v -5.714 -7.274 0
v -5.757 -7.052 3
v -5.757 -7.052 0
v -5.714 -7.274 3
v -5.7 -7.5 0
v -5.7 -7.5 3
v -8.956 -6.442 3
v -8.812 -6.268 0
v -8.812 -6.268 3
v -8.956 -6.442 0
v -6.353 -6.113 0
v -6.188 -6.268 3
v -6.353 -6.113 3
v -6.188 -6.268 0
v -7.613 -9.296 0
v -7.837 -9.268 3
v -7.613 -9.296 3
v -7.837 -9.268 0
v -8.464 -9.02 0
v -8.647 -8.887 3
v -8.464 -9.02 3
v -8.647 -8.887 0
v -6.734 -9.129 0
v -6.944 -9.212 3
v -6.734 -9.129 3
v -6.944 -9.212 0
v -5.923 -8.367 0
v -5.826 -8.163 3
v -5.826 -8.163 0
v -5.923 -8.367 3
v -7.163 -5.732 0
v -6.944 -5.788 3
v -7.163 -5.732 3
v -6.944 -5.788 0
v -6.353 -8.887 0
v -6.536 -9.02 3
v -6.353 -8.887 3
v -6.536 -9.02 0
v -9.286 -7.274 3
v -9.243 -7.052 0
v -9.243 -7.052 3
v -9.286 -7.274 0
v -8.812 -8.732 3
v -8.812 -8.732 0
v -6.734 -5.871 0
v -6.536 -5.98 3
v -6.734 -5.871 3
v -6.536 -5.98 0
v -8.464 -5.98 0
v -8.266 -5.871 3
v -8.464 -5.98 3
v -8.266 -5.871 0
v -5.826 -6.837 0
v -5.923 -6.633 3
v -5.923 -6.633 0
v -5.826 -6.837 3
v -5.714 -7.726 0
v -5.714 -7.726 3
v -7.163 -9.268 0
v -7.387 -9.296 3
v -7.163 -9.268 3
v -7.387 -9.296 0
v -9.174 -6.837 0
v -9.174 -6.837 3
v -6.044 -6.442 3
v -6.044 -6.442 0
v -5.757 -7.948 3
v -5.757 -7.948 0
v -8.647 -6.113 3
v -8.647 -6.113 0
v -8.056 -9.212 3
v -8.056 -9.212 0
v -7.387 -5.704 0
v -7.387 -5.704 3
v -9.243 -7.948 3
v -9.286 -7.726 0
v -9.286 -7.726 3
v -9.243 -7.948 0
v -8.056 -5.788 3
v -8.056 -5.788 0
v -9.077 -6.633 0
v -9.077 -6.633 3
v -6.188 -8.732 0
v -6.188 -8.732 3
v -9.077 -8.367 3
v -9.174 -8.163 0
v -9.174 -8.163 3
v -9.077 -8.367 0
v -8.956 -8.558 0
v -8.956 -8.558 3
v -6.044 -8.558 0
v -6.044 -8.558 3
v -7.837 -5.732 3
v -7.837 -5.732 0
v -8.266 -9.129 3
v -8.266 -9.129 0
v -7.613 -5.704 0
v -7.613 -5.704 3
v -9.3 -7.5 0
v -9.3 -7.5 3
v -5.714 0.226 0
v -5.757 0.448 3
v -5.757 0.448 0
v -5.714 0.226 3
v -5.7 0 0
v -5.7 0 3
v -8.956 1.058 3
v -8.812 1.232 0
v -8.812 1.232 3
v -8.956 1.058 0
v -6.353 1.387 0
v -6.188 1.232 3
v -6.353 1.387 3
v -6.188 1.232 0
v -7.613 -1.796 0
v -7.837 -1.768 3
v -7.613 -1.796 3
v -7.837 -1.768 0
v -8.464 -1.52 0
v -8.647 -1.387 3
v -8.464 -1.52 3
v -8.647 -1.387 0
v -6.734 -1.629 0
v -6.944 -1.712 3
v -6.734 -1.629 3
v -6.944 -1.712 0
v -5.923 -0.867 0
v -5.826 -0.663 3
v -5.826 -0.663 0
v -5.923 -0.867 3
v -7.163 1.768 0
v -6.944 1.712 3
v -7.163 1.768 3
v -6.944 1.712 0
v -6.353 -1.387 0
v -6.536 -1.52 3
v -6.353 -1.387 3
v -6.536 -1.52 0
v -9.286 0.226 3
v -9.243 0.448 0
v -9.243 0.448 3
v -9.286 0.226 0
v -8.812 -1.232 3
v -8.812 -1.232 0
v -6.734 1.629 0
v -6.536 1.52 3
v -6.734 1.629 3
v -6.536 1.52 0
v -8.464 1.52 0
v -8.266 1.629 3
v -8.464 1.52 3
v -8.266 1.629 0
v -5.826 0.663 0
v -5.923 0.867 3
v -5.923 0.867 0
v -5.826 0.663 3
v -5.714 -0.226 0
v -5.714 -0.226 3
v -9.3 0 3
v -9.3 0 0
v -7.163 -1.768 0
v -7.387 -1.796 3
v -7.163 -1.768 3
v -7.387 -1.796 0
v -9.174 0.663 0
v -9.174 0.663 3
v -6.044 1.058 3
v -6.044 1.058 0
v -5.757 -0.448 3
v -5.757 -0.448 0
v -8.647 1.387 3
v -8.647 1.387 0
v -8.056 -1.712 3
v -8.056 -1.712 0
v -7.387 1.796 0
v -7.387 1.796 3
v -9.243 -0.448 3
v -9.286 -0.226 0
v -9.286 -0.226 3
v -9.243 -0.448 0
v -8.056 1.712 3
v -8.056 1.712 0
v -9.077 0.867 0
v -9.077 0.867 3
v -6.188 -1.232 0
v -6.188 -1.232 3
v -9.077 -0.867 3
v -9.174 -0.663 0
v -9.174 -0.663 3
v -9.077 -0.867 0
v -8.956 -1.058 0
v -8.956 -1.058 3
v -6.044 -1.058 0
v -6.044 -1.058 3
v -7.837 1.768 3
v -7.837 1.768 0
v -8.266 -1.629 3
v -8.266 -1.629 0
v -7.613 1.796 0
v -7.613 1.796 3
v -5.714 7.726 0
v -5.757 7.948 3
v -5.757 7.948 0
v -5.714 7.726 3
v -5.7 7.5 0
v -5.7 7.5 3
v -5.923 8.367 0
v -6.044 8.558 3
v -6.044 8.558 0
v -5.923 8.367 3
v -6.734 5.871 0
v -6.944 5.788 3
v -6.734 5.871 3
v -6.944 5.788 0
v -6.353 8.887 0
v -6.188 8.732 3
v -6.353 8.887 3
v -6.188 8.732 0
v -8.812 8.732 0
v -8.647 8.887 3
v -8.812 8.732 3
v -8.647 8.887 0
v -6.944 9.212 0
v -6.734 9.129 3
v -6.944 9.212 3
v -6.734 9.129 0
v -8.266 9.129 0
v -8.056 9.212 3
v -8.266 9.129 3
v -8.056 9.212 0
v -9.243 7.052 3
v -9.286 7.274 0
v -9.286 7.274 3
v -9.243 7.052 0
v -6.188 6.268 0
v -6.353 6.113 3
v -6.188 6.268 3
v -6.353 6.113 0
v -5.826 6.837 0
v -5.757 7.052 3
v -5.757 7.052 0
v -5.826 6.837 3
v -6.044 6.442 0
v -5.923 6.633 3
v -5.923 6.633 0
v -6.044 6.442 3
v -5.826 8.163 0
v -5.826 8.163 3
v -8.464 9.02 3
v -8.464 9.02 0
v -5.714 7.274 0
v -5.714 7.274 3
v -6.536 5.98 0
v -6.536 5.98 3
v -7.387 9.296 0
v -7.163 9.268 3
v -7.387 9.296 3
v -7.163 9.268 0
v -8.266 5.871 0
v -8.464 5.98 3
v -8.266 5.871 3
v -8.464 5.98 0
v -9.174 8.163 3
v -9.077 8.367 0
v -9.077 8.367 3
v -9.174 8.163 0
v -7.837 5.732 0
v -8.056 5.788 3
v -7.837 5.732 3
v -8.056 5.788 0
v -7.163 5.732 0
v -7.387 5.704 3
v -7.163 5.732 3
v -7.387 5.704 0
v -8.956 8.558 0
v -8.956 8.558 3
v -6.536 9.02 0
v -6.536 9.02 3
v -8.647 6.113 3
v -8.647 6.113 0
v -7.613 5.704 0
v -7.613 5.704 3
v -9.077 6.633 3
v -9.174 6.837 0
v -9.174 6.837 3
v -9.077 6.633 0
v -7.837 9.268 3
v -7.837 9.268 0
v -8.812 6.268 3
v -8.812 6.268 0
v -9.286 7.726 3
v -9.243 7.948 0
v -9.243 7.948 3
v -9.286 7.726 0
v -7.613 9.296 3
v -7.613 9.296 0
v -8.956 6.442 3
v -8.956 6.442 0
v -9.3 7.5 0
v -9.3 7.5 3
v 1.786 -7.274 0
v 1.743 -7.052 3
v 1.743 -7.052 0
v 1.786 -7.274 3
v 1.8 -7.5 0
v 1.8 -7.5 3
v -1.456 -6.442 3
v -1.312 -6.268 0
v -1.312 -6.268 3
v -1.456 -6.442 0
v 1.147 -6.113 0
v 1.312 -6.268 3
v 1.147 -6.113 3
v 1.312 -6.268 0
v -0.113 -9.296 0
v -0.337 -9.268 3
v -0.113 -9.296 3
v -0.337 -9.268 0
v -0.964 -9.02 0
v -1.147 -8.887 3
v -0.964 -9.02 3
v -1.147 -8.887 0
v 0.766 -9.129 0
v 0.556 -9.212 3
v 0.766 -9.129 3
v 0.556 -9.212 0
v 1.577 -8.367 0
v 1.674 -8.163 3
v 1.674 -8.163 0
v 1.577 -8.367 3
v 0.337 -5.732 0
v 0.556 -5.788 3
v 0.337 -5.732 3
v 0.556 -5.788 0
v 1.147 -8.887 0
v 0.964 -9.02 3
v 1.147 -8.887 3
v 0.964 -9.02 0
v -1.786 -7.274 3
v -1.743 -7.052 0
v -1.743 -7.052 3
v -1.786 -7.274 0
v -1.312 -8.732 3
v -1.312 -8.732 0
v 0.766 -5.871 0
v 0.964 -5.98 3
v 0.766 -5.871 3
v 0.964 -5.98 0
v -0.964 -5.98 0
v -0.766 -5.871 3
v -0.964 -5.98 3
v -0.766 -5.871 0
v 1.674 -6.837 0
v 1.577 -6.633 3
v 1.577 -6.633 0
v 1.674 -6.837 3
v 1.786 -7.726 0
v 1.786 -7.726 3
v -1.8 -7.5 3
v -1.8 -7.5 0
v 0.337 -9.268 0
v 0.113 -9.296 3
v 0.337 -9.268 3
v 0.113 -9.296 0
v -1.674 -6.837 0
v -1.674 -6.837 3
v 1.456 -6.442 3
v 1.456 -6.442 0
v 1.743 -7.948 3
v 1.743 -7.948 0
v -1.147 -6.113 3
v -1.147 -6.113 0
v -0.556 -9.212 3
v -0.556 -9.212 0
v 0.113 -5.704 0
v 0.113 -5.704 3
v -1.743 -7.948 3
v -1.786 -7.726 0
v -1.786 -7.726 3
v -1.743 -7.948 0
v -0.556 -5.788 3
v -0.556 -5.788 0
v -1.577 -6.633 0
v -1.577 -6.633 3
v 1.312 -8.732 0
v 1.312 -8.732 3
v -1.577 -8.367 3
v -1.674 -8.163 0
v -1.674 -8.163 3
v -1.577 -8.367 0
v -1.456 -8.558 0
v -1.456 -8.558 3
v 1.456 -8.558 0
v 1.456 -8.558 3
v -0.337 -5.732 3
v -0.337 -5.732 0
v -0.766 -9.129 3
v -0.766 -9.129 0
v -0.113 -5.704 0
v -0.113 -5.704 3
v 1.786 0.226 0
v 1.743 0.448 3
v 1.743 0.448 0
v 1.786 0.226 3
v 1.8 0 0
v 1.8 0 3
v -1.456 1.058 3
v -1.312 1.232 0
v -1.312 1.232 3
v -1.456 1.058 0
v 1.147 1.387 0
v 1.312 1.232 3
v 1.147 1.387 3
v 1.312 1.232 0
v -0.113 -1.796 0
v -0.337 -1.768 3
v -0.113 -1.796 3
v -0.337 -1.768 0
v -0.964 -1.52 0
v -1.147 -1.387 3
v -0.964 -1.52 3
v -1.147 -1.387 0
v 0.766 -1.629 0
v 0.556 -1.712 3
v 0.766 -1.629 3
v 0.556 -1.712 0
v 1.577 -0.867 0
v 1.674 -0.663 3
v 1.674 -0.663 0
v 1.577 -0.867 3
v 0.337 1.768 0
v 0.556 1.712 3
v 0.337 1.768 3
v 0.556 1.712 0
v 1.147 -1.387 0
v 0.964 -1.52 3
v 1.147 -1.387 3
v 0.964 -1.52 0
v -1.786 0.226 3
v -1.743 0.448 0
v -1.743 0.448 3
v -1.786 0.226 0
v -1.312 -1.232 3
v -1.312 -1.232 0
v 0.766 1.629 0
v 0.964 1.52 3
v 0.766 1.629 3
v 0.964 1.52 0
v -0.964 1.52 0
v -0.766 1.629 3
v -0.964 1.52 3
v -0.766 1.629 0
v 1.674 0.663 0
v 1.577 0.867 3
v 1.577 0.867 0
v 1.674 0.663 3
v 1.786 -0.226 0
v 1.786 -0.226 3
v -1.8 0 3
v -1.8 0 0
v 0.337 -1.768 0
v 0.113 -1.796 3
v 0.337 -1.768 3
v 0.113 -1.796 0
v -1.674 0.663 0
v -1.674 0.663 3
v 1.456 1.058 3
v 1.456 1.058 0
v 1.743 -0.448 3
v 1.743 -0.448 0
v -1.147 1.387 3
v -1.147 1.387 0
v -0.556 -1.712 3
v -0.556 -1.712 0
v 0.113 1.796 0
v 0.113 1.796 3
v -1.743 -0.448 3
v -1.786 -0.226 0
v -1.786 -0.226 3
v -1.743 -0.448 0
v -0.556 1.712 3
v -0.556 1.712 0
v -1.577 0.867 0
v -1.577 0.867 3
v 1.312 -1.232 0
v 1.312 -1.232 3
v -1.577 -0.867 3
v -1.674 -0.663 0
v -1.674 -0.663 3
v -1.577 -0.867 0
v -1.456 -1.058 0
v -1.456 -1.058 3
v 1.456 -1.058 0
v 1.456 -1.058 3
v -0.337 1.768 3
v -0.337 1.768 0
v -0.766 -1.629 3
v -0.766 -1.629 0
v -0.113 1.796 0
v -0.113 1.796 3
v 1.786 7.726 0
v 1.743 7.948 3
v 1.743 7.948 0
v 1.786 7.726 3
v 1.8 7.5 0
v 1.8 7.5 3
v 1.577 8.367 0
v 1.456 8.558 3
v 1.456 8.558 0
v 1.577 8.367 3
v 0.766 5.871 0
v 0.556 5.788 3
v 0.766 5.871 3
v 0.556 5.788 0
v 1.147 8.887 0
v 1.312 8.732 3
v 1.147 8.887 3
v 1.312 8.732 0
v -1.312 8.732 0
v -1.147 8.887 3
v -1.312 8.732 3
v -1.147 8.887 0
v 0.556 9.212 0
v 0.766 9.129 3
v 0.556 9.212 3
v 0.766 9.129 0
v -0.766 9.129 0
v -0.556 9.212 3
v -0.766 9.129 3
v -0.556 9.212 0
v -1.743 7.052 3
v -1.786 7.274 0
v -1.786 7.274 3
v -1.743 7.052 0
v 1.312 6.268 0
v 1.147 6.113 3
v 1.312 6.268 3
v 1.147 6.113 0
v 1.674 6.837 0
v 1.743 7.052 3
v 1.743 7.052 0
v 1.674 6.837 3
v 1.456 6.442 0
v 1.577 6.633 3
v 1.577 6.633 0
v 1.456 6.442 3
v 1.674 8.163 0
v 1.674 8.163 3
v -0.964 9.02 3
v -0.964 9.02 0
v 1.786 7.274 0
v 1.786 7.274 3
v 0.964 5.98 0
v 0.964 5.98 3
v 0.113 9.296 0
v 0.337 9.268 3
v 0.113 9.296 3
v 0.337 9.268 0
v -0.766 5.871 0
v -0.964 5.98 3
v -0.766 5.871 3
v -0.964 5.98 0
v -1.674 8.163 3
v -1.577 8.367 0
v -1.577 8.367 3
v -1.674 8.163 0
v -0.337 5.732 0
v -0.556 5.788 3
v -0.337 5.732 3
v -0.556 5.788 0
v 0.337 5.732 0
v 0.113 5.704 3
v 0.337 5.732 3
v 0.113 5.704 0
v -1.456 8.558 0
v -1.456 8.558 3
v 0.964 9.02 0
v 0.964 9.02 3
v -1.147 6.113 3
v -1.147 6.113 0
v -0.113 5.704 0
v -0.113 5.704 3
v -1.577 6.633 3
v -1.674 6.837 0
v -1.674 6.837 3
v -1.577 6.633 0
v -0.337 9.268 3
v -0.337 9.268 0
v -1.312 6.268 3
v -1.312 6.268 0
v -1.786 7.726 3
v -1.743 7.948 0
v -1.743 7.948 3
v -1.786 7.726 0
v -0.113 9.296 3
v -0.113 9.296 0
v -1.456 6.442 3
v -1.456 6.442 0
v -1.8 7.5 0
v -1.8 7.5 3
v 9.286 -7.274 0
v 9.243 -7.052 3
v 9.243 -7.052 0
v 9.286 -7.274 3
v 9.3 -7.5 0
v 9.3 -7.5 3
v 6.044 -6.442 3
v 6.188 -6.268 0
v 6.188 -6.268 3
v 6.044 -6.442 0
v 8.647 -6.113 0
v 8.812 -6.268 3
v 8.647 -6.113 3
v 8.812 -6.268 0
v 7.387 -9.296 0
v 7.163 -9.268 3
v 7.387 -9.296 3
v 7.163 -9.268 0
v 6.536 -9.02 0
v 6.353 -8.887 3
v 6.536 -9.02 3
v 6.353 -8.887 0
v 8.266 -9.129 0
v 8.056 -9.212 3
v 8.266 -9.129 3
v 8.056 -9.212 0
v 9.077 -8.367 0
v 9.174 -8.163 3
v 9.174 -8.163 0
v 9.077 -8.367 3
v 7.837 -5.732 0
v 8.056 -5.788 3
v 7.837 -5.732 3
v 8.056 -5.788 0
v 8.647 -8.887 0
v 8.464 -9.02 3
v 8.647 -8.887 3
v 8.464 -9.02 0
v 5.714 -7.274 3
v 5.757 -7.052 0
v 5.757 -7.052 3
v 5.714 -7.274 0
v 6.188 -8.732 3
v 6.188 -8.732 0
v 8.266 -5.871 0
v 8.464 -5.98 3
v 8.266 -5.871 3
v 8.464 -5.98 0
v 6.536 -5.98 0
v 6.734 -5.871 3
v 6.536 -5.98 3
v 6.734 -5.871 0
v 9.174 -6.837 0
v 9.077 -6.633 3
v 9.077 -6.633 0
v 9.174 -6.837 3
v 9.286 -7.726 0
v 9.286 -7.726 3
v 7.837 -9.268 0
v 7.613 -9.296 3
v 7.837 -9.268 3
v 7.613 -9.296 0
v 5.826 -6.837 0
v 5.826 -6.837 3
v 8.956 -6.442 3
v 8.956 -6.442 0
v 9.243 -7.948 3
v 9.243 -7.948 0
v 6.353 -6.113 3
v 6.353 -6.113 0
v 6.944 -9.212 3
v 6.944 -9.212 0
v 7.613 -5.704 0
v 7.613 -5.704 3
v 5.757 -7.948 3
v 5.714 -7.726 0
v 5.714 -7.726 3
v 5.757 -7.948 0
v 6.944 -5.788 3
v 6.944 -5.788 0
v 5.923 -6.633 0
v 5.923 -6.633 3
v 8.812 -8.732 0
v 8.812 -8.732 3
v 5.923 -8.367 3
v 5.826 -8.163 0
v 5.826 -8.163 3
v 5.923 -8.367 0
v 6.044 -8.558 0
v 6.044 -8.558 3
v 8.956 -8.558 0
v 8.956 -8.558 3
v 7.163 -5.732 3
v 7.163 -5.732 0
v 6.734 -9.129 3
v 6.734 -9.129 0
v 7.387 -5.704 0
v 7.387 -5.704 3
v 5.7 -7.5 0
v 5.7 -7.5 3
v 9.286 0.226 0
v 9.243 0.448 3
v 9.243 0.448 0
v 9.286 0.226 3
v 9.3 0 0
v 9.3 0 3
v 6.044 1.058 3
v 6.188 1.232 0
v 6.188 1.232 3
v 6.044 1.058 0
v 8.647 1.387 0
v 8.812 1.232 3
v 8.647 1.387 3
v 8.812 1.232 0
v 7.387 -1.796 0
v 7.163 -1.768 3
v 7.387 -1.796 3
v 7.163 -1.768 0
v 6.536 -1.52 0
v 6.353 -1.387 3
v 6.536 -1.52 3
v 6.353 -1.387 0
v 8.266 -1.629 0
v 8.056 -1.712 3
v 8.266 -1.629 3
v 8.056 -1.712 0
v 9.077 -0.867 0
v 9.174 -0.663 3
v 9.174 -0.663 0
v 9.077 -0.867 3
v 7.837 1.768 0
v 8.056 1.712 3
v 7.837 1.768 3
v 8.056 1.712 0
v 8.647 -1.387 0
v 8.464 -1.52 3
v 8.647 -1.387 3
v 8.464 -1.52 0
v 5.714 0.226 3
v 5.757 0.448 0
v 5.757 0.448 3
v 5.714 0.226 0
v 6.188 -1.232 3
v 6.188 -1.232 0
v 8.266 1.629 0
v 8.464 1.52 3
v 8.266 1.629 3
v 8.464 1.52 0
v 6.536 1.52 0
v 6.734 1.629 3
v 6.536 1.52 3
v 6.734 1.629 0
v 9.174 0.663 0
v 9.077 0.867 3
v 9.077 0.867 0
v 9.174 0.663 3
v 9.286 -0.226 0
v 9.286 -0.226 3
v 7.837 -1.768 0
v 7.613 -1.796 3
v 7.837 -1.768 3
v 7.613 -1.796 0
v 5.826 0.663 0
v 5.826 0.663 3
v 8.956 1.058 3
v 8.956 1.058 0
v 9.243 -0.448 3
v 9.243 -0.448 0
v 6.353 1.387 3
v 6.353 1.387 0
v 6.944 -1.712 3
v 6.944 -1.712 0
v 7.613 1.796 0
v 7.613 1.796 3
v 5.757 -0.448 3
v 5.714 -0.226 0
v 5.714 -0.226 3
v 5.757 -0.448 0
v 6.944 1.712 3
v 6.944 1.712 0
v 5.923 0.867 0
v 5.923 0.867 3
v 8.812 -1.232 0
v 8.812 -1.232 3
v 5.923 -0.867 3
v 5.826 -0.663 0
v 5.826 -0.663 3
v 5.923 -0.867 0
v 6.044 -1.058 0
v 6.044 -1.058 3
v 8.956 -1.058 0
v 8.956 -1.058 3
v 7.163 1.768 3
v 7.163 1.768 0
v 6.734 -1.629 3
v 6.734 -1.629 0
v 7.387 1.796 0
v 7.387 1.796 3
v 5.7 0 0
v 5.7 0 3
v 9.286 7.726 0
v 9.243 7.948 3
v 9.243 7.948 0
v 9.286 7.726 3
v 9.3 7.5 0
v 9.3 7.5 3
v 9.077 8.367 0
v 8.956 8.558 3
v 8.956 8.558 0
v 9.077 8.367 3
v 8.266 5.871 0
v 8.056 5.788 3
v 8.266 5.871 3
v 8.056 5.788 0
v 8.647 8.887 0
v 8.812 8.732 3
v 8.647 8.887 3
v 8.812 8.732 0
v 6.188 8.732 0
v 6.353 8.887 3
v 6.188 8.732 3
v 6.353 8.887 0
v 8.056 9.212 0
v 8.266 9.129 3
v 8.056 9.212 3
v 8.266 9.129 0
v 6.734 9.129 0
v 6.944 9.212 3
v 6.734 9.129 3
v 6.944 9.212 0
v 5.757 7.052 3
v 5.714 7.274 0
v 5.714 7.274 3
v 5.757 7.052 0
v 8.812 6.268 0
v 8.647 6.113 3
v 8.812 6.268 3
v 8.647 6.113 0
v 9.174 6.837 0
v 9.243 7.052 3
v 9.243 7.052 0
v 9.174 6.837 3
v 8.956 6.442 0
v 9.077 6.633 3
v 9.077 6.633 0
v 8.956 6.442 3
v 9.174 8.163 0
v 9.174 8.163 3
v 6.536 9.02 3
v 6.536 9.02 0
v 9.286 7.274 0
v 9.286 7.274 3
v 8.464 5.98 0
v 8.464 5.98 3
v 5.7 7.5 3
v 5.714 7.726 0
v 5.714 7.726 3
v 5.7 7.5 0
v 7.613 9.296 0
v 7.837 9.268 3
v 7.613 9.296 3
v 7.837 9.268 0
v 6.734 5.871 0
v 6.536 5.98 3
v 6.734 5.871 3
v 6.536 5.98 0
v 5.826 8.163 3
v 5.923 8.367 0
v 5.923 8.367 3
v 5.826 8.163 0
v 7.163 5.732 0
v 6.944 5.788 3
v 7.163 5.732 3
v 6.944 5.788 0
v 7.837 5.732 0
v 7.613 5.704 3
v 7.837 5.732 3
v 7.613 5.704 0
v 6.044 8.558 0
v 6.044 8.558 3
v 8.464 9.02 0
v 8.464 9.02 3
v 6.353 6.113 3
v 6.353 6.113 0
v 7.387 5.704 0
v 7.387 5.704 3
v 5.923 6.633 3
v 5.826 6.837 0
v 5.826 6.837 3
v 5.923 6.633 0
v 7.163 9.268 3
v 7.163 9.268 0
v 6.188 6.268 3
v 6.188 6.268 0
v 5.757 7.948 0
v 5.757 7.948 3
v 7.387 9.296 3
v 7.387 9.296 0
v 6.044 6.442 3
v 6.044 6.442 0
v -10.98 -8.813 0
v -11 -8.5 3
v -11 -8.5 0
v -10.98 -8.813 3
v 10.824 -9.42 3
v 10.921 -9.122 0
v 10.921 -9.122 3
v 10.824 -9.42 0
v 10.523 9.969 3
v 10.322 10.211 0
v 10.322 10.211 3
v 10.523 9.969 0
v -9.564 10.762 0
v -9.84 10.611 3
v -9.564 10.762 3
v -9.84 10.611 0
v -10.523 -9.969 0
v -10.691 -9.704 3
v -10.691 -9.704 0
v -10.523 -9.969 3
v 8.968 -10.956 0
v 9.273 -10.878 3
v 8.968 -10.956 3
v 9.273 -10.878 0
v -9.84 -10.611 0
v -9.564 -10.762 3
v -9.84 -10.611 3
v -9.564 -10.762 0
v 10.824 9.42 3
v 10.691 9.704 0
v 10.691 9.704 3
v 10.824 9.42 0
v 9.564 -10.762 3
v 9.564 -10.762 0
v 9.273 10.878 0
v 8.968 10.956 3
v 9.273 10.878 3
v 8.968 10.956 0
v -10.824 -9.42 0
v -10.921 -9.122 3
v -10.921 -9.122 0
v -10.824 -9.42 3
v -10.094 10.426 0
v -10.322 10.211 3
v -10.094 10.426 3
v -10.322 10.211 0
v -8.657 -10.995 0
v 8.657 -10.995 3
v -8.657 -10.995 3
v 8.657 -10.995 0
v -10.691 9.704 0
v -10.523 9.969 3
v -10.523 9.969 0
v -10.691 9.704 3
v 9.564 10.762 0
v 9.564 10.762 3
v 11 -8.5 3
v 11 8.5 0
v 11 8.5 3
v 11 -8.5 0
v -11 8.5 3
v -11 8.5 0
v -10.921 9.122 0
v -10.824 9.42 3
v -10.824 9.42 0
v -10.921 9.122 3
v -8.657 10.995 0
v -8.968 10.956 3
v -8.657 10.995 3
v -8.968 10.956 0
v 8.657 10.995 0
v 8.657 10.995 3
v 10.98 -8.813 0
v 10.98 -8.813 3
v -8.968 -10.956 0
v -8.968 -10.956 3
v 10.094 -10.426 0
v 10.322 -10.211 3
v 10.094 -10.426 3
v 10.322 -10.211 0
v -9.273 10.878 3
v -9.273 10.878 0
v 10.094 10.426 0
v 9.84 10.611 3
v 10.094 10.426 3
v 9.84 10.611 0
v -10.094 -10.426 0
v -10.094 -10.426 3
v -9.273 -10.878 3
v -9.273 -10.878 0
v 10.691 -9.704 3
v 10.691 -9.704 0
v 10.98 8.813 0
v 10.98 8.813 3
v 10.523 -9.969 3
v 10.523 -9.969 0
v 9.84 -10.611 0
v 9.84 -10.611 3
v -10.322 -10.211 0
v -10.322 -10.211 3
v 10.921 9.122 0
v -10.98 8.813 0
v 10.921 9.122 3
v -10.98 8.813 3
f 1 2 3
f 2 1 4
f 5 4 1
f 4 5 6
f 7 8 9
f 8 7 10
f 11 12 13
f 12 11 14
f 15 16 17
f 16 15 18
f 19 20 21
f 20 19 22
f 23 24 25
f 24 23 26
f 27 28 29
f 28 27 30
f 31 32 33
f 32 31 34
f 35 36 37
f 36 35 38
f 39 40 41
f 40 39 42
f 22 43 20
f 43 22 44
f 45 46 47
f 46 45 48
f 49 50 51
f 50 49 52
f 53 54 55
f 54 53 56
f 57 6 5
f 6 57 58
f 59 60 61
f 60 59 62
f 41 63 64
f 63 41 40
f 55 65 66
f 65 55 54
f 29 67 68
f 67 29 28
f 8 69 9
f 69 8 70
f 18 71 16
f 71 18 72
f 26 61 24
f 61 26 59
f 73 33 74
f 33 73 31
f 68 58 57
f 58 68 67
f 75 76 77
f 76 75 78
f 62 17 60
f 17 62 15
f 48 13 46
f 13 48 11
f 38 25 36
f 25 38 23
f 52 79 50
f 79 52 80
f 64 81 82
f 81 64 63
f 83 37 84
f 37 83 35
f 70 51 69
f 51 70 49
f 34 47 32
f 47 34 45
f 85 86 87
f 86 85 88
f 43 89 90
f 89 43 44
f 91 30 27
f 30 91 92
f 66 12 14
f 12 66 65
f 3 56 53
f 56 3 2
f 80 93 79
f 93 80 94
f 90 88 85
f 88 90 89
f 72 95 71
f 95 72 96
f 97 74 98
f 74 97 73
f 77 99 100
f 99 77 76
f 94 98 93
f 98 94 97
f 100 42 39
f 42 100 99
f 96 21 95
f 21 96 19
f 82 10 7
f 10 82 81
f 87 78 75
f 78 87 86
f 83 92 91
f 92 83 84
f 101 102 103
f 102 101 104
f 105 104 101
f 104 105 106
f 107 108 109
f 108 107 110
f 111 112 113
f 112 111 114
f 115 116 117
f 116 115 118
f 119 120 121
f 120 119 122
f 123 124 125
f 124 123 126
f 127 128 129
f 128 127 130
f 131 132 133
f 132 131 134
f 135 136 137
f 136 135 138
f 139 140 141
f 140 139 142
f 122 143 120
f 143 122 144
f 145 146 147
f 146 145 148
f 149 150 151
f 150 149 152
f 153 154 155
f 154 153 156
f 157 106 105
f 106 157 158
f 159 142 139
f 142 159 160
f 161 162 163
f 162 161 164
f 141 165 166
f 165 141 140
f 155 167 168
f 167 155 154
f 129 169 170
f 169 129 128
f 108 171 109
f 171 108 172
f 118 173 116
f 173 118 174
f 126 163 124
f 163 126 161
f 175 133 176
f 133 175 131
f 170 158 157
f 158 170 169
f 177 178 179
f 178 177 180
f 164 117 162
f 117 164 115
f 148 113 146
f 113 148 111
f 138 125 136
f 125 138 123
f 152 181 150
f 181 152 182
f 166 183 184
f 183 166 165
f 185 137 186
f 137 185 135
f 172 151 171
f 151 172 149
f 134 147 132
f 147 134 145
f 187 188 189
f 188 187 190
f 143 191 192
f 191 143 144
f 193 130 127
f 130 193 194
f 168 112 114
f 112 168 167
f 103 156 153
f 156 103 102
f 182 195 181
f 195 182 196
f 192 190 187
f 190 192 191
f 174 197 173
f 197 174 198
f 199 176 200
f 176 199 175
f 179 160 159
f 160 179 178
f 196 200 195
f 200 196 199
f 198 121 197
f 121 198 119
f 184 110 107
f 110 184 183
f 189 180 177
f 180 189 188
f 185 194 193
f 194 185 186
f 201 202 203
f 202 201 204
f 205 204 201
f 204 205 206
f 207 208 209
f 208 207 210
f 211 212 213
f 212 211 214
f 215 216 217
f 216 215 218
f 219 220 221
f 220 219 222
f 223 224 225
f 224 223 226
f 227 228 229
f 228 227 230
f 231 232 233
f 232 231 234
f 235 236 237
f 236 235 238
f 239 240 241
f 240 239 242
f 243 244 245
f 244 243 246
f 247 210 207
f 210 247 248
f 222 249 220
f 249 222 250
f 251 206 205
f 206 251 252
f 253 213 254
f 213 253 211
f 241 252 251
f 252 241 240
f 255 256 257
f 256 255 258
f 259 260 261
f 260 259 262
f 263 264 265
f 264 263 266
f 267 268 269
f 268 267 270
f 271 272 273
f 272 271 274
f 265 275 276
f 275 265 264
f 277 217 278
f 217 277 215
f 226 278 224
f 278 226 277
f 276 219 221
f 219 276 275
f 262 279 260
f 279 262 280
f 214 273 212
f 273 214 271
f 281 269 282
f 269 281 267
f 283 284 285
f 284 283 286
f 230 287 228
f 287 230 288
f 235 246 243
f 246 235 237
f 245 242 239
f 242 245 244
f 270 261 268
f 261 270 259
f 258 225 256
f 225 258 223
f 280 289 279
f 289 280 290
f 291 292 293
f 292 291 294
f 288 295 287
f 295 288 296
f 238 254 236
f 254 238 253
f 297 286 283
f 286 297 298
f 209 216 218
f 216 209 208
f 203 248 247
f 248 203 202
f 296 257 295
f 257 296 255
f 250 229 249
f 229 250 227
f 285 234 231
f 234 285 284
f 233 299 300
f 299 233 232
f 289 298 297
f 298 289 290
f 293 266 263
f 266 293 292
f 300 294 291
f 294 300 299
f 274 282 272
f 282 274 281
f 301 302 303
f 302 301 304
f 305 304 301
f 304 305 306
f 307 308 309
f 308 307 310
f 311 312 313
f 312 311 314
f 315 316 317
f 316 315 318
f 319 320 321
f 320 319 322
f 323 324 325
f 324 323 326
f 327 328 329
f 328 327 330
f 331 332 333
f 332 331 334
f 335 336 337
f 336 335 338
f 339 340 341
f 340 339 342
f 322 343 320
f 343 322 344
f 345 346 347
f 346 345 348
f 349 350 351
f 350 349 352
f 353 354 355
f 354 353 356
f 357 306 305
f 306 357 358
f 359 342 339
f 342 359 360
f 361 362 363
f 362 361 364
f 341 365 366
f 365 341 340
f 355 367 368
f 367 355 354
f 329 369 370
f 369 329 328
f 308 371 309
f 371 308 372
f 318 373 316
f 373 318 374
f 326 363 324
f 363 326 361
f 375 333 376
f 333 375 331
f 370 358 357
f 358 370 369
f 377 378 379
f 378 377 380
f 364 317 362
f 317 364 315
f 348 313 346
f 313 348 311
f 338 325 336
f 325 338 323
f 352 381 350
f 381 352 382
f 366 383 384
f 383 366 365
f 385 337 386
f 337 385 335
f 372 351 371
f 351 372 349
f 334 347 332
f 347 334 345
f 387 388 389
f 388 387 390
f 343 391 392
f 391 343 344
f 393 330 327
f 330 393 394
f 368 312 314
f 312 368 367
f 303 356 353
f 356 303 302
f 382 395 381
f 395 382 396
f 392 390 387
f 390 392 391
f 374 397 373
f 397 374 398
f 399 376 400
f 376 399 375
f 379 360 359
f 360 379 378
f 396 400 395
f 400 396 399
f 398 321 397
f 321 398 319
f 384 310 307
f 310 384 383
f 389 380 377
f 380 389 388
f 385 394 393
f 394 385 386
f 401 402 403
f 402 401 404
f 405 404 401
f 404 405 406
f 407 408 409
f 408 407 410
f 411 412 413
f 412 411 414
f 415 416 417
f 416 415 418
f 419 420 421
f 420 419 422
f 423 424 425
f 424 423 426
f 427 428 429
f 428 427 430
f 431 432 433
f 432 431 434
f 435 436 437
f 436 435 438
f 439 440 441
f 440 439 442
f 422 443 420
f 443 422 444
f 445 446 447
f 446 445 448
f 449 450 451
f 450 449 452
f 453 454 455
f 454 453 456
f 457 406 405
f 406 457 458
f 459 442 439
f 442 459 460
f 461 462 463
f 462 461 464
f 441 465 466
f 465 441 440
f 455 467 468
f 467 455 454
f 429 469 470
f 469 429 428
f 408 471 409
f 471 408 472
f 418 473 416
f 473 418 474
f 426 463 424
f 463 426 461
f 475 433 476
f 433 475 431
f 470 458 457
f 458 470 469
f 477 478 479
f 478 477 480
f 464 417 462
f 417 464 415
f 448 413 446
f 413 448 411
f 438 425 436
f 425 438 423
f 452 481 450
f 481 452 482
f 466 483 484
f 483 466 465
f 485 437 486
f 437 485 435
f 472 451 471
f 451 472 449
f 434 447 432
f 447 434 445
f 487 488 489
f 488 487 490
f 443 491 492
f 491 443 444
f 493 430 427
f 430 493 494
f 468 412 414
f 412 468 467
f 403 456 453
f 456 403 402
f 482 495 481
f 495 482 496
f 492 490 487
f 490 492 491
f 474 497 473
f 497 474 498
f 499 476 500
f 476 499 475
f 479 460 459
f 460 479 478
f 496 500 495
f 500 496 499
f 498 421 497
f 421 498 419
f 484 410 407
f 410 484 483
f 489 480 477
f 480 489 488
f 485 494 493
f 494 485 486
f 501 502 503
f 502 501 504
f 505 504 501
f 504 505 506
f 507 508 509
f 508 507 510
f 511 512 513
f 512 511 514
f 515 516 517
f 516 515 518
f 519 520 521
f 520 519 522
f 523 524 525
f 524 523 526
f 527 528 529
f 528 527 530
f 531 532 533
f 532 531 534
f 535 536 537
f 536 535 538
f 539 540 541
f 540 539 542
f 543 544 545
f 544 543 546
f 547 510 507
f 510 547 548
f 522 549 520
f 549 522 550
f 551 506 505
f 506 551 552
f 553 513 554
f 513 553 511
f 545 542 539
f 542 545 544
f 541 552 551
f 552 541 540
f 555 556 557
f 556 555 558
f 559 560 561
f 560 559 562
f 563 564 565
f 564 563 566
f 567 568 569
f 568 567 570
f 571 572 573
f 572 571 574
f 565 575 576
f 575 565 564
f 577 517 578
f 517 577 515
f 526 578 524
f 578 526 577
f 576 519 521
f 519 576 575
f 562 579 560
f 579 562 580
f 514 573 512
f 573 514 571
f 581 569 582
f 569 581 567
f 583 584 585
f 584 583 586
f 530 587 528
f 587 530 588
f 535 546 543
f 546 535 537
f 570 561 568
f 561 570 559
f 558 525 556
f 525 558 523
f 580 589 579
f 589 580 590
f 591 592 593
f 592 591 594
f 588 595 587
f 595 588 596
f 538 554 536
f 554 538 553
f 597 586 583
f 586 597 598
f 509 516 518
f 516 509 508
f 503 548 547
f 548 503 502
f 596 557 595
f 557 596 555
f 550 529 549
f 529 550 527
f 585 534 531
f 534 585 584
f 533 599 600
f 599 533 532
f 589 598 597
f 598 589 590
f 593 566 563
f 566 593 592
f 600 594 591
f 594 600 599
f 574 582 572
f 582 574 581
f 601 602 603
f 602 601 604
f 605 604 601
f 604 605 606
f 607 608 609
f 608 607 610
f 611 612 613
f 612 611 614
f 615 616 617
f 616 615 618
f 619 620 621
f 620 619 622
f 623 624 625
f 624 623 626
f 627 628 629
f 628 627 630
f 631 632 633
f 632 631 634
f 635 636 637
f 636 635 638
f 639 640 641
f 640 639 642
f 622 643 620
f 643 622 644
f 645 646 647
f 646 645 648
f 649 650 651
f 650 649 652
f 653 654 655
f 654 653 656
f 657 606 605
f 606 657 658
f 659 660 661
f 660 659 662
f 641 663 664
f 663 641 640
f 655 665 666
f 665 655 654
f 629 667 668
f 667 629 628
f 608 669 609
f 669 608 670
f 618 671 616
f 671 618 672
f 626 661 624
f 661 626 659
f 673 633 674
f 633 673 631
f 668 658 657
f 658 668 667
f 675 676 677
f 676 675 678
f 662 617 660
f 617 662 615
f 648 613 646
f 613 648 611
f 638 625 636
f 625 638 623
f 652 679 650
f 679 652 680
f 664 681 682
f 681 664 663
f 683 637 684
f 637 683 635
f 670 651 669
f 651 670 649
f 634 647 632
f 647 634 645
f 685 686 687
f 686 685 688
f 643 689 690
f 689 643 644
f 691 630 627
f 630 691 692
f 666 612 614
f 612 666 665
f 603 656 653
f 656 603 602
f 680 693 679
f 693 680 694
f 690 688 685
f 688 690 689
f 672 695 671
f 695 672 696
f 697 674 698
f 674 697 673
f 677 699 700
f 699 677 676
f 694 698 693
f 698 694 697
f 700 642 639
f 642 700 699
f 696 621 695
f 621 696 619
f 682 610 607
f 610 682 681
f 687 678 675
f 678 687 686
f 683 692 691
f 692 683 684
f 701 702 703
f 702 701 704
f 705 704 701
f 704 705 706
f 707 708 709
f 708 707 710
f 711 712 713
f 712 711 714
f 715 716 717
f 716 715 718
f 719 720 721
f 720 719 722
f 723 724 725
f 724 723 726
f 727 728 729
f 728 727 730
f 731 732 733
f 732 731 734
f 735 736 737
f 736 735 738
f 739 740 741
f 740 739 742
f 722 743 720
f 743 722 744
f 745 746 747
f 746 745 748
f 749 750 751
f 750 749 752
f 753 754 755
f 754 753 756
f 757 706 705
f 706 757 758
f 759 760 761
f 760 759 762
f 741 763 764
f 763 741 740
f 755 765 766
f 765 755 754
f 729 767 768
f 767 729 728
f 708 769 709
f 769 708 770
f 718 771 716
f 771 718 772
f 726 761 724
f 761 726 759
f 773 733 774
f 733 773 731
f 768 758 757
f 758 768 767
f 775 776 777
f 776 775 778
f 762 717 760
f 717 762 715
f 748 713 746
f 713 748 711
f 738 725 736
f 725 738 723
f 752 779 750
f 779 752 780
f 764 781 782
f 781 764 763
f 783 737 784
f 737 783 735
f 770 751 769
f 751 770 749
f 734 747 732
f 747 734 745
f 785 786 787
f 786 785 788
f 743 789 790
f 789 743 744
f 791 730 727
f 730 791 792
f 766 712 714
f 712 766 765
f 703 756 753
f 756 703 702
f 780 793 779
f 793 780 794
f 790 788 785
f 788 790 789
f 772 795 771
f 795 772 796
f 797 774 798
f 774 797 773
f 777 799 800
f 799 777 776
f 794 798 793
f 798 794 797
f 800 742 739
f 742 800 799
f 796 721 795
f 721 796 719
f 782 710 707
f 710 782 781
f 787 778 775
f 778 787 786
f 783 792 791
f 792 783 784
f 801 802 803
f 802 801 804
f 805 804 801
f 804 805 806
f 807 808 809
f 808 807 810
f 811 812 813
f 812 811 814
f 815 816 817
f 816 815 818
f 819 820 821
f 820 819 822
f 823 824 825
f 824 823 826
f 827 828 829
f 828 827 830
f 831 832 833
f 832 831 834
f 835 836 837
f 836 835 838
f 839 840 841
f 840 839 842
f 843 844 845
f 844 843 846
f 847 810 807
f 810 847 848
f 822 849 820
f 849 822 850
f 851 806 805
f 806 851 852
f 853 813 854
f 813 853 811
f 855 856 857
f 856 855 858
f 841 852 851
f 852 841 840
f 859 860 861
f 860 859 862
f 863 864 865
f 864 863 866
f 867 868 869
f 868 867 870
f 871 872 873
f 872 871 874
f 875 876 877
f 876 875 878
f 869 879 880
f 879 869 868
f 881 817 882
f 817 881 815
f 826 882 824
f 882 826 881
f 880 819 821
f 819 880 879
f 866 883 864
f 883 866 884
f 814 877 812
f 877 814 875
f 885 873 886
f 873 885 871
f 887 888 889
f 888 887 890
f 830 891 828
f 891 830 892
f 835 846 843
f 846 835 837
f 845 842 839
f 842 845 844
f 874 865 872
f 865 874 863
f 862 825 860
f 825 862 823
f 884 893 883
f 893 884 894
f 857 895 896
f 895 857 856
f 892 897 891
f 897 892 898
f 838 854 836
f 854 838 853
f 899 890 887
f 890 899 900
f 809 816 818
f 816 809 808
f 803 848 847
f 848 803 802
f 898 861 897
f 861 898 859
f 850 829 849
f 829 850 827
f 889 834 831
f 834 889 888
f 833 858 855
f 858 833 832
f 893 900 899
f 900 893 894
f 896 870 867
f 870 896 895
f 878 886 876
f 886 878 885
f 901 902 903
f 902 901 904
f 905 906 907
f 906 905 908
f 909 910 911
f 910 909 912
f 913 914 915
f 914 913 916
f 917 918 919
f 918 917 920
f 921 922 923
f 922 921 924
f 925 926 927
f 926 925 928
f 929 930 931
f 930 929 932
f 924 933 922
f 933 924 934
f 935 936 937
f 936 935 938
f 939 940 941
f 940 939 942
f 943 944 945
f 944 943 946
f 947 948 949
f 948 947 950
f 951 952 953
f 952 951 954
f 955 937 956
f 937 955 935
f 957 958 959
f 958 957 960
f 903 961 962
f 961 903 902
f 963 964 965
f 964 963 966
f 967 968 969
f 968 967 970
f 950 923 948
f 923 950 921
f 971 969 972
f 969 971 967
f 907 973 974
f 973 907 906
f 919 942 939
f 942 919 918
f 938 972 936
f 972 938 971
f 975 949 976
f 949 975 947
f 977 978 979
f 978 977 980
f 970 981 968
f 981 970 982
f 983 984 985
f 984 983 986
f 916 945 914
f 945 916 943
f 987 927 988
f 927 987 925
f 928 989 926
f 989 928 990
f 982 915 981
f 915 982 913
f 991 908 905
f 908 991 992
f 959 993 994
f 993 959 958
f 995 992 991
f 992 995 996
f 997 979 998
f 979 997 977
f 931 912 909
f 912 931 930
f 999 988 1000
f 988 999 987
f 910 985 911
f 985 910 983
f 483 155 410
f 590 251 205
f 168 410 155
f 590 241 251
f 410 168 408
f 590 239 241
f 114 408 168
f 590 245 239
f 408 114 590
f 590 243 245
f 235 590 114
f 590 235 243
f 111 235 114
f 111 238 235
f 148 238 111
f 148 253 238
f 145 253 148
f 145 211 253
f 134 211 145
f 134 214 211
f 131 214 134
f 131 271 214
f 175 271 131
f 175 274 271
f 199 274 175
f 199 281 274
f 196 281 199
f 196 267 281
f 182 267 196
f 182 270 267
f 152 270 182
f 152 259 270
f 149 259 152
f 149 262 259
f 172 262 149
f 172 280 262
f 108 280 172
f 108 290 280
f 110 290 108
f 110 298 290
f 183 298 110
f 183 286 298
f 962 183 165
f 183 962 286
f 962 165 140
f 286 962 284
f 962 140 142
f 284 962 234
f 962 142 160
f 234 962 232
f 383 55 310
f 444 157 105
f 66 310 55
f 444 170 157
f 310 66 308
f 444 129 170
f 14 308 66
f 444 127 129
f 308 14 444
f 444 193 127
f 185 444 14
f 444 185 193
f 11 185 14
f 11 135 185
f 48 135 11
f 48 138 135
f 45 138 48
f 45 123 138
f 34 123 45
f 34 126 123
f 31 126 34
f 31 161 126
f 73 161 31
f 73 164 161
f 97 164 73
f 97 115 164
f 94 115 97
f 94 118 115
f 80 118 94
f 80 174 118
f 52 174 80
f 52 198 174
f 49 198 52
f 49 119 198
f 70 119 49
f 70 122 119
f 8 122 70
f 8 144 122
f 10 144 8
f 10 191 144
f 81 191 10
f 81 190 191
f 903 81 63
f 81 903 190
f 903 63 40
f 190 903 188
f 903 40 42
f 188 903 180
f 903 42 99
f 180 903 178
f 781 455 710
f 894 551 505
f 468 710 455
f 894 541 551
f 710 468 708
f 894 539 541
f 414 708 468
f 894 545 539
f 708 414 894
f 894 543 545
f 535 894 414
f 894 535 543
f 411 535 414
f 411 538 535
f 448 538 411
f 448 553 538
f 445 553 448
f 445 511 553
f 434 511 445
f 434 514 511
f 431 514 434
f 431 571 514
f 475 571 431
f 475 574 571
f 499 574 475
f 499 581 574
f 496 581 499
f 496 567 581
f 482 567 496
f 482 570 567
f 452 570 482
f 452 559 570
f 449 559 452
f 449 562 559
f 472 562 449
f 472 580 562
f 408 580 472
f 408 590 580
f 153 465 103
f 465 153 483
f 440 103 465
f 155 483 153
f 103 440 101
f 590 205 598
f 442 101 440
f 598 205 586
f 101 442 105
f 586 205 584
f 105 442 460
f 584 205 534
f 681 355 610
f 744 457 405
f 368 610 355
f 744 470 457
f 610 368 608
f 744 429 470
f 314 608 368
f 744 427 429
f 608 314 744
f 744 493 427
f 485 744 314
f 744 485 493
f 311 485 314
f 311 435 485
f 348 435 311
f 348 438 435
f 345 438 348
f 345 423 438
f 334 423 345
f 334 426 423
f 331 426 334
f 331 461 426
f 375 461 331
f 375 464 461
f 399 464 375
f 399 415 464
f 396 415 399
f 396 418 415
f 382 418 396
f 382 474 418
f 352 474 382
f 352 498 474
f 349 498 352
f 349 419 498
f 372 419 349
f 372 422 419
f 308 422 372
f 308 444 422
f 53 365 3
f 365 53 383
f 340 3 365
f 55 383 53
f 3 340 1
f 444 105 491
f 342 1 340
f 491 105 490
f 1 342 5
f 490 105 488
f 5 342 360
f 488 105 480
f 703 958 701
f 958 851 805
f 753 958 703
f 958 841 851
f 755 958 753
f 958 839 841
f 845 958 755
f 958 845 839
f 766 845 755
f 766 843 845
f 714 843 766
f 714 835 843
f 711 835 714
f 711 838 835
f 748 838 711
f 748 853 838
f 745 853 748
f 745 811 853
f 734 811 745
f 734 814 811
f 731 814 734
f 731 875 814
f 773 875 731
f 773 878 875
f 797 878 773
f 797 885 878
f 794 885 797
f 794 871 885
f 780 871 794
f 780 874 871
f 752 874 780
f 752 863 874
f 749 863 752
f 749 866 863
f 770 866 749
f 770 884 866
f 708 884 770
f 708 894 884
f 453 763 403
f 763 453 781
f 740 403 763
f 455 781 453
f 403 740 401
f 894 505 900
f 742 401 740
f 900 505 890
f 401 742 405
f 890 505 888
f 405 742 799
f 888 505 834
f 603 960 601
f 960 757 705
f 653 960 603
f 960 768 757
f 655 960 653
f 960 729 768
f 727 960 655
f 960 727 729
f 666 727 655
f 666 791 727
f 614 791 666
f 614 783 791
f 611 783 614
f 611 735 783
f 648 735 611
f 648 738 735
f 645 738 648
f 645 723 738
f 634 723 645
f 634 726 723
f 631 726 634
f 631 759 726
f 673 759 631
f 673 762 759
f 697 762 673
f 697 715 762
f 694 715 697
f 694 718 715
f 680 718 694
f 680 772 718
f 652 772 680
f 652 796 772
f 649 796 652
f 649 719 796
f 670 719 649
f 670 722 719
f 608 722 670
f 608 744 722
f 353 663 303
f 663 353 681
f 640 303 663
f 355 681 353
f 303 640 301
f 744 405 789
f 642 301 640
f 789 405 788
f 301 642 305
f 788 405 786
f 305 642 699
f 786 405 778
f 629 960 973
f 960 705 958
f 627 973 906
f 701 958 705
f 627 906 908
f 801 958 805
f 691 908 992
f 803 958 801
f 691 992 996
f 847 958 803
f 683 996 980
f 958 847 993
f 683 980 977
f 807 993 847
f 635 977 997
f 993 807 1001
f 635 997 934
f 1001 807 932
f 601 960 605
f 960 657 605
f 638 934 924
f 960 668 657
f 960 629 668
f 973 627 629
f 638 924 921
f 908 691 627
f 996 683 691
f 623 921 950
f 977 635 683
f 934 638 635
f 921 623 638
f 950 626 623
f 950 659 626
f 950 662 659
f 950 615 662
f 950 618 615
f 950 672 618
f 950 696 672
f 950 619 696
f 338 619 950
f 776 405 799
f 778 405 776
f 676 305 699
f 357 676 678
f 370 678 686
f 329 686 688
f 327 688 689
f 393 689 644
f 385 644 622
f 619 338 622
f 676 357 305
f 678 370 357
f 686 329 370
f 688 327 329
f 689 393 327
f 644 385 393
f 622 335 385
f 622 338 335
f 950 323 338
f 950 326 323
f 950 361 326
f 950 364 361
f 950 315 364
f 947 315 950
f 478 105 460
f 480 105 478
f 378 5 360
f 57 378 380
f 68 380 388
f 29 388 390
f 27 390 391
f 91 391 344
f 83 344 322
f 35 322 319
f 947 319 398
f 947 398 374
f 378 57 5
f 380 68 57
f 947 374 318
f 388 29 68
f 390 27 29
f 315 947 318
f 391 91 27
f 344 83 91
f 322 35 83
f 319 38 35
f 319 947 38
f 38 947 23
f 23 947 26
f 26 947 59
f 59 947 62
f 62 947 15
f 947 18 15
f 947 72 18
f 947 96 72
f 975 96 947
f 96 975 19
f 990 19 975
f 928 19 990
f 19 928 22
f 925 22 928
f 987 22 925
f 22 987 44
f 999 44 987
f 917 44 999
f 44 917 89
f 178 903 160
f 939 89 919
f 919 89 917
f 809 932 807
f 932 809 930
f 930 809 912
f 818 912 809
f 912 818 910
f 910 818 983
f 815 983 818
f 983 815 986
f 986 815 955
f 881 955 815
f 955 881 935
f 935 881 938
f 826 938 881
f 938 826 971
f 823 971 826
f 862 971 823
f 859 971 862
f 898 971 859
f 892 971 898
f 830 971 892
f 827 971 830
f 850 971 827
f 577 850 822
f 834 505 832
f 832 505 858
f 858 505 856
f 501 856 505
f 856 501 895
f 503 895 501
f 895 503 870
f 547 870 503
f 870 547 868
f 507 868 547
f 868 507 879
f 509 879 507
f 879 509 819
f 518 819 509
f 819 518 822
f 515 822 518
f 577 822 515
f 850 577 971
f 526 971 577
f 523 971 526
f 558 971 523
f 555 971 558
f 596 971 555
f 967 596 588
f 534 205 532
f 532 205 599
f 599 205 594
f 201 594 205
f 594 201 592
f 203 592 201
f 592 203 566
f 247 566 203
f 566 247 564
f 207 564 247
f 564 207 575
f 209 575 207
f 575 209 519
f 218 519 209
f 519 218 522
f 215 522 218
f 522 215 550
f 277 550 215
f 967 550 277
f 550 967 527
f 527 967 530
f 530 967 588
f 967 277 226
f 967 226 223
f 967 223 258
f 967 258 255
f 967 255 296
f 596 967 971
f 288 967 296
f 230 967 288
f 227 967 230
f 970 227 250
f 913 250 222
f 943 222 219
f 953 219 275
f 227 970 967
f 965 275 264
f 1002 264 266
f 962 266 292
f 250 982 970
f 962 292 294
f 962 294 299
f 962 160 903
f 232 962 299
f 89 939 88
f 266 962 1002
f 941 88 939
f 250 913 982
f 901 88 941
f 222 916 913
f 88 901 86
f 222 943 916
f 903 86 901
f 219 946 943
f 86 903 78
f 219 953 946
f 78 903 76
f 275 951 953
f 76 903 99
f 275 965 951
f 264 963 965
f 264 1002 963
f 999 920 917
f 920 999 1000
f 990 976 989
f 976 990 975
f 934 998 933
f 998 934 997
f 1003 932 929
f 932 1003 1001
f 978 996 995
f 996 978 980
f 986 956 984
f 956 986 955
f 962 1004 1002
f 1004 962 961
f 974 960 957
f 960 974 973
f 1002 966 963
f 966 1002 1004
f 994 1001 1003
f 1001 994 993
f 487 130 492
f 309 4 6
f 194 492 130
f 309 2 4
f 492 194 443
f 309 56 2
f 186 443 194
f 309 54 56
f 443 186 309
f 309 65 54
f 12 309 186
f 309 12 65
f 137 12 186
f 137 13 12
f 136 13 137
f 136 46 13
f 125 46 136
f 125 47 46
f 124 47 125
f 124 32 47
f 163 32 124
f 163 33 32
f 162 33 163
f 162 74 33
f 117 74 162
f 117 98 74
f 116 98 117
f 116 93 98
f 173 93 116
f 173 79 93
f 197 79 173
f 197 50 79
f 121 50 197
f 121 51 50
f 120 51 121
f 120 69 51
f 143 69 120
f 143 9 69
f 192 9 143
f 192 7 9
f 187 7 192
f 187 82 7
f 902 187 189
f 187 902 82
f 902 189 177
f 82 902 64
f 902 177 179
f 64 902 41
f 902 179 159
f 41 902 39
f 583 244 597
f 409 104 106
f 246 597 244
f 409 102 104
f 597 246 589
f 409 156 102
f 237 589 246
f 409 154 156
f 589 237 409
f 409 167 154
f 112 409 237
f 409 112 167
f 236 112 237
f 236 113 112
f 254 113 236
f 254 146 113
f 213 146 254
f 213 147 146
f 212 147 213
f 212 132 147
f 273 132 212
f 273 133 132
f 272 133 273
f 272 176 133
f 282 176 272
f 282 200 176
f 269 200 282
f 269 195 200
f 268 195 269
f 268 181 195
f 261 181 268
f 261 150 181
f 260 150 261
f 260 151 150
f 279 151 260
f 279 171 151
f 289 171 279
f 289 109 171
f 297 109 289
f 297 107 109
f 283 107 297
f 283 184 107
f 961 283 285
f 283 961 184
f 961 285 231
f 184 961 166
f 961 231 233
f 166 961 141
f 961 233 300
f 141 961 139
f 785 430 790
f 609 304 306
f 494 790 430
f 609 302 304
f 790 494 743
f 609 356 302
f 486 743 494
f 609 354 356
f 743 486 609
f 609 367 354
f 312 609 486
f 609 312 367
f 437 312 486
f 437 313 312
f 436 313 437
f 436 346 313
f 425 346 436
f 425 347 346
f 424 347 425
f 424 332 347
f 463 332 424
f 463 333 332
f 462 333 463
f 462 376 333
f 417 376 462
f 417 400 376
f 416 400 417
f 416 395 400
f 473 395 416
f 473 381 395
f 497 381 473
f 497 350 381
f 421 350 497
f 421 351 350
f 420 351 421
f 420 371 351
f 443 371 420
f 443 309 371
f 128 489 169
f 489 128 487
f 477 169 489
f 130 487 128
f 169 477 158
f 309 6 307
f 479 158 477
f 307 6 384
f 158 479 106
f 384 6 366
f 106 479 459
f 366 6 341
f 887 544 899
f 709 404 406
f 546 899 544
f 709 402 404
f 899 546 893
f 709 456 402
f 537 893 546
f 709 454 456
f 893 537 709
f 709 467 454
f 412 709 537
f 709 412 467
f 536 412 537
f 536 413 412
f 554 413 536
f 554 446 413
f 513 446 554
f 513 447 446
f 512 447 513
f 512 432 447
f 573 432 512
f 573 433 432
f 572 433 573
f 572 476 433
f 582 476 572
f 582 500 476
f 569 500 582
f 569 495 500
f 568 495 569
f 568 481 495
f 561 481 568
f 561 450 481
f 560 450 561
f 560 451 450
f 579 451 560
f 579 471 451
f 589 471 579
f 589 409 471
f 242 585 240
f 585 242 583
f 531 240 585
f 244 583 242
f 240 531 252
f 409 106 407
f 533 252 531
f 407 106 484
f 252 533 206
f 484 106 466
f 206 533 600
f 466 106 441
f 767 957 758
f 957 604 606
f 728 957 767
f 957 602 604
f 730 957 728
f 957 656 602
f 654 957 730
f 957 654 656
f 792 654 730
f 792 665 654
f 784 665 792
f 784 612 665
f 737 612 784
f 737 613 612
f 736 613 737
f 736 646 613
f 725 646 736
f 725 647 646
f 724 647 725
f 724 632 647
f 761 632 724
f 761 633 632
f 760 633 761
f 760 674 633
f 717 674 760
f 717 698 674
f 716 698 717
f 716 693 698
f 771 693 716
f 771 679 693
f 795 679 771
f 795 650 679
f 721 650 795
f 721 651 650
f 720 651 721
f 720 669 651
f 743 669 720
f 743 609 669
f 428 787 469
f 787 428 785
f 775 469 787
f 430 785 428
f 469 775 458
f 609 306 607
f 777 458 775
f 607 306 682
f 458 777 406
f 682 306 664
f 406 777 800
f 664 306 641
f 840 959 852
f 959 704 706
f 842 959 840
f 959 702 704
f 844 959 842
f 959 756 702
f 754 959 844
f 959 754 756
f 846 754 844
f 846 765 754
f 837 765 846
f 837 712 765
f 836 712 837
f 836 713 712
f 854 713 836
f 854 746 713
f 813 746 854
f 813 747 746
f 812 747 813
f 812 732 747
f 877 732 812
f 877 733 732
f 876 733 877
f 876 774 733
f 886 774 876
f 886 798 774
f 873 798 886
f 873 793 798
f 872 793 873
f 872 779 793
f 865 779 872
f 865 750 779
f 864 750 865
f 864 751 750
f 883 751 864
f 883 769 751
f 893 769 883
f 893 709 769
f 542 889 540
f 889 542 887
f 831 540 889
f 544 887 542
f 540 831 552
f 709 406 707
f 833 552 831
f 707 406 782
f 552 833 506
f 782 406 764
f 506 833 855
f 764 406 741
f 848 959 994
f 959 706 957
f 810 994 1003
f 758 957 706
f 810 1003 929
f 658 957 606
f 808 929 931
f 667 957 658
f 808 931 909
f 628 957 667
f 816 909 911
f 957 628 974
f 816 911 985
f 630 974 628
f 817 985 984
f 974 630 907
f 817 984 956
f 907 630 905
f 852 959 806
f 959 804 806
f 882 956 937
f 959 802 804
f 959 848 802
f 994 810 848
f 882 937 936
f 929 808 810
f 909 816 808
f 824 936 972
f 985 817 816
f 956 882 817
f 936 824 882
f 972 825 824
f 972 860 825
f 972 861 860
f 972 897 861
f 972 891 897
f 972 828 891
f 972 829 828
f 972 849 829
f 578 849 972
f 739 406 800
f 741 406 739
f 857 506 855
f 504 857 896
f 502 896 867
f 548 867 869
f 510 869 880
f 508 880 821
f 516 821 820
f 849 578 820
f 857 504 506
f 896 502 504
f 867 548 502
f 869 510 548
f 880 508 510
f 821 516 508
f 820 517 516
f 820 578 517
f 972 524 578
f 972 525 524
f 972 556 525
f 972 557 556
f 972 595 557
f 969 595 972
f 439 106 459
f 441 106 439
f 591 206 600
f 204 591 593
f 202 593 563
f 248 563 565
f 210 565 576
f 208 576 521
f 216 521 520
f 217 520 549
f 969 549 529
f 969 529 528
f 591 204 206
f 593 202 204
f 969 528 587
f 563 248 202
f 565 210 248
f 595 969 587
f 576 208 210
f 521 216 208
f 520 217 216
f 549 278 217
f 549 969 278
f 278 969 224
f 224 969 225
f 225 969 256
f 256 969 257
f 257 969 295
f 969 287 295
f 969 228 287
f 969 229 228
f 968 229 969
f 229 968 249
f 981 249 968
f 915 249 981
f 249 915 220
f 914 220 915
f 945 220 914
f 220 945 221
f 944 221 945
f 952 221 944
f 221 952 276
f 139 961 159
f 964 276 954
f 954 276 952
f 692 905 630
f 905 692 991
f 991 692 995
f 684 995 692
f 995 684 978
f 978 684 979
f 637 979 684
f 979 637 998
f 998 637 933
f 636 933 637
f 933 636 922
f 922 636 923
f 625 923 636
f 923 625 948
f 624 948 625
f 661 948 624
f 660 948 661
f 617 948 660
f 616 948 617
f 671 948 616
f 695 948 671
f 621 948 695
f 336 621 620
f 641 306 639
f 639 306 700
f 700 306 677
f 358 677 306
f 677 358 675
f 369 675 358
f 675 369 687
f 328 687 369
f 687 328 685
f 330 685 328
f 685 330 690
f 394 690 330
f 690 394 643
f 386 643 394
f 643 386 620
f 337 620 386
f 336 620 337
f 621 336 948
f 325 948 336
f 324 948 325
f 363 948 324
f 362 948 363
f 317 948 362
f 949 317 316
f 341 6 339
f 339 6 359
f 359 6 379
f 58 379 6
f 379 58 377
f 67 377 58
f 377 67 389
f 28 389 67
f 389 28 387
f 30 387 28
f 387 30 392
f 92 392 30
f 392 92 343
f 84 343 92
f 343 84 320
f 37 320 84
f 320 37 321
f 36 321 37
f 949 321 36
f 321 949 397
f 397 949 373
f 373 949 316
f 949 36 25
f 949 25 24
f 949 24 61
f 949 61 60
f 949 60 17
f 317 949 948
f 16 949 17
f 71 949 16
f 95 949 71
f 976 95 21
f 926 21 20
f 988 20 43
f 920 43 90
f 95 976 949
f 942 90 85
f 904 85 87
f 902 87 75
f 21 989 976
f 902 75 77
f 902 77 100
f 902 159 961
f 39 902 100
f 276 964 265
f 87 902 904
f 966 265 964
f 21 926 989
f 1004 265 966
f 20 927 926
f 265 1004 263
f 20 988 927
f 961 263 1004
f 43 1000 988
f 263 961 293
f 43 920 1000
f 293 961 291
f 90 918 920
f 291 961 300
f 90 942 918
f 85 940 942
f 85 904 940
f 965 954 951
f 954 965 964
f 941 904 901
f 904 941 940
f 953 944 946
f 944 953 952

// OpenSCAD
$fn = 50;


difference() {
	union() {
		translate(v = [0, 0, 0]) {
			rotate(a = [0, 0, 0]) {
				hull() {
					translate(v = [-8.5000000000, 8.5000000000, 0]) {
						rotate(a = [0, 0, 0]) {
							translate(v = [0, 0, 0]) {
								rotate(a = [0, 0, 0]) {
									cylinder(h = 3, r = 2.5000000000);
								}
							}
						}
					}
					translate(v = [8.5000000000, 8.5000000000, 0]) {
						rotate(a = [0, 0, 0]) {
							translate(v = [0, 0, 0]) {
								rotate(a = [0, 0, 0]) {
									cylinder(h = 3, r = 2.5000000000);
								}
							}
						}
					}
					translate(v = [-8.5000000000, -8.5000000000, 0]) {
						rotate(a = [0, 0, 0]) {
							translate(v = [0, 0, 0]) {
								rotate(a = [0, 0, 0]) {
									cylinder(h = 3, r = 2.5000000000);
								}
							}
						}
					}
					translate(v = [8.5000000000, -8.5000000000, 0]) {
						rotate(a = [0, 0, 0]) {
							translate(v = [0, 0, 0]) {
								rotate(a = [0, 0, 0]) {
									cylinder(h = 3, r = 2.5000000000);
								}
							}
						}
					}
				}
			}
		}
	}
	union() {
		translate(v = [-7.5000000000, -7.5000000000, 0]) {
			rotate(a = [0, 0, 0]) {
				translate(v = [0, 0, -50]) {
					rotate(a = [0, 0, 0]) {
						cylinder(h = 100, r = 1.8000000000);
					}
				}
			}
		}
		translate(v = [-7.5000000000, 0.0000000000, 0]) {
			rotate(a = [0, 0, 0]) {
				translate(v = [0, 0, -50]) {
					rotate(a = [0, 0, 0]) {
						cylinder(h = 100, r = 1.8000000000);
					}
				}
			}
		}
		translate(v = [-7.5000000000, 7.5000000000, 0]) {
			rotate(a = [0, 0, 0]) {
				translate(v = [0, 0, -50]) {
					rotate(a = [0, 0, 0]) {
						cylinder(h = 100, r = 1.8000000000);
					}
				}
			}
		}
		translate(v = [0.0000000000, -7.5000000000, 0]) {
			rotate(a = [0, 0, 0]) {
				translate(v = [0, 0, -50]) {
					rotate(a = [0, 0, 0]) {
						cylinder(h = 100, r = 1.8000000000);
					}
				}
			}
		}
		translate(v = [0.0000000000, 0.0000000000, 0]) {
			rotate(a = [0, 0, 0]) {
				translate(v = [0, 0, -50]) {
					rotate(a = [0, 0, 0]) {
						cylinder(h = 100, r = 1.8000000000);
					}
				}
			}
		}
		translate(v = [0.0000000000, 7.5000000000, 0]) {
			rotate(a = [0, 0, 0]) {
				translate(v = [0, 0, -50]) {
					rotate(a = [0, 0, 0]) {
						cylinder(h = 100, r = 1.8000000000);
					}
				}
			}
		}
		translate(v = [7.5000000000, -7.5000000000, 0]) {
			rotate(a = [0, 0, 0]) {
				translate(v = [0, 0, -50]) {
					rotate(a = [0, 0, 0]) {
						cylinder(h = 100, r = 1.8000000000);
					}
				}
			}
		}
		translate(v = [7.5000000000, 0.0000000000, 0]) {
			rotate(a = [0, 0, 0]) {
				translate(v = [0, 0, -50]) {
					rotate(a = [0, 0, 0]) {
						cylinder(h = 100, r = 1.8000000000);
					}
				}
			}
		}
		translate(v = [7.5000000000, 7.5000000000, 0]) {
			rotate(a = [0, 0, 0]) {
				translate(v = [0, 0, -50]) {
					rotate(a = [0, 0, 0]) {
						cylinder(h = 100, r = 1.8000000000);
					}
				}
			}
		}
	}
}
